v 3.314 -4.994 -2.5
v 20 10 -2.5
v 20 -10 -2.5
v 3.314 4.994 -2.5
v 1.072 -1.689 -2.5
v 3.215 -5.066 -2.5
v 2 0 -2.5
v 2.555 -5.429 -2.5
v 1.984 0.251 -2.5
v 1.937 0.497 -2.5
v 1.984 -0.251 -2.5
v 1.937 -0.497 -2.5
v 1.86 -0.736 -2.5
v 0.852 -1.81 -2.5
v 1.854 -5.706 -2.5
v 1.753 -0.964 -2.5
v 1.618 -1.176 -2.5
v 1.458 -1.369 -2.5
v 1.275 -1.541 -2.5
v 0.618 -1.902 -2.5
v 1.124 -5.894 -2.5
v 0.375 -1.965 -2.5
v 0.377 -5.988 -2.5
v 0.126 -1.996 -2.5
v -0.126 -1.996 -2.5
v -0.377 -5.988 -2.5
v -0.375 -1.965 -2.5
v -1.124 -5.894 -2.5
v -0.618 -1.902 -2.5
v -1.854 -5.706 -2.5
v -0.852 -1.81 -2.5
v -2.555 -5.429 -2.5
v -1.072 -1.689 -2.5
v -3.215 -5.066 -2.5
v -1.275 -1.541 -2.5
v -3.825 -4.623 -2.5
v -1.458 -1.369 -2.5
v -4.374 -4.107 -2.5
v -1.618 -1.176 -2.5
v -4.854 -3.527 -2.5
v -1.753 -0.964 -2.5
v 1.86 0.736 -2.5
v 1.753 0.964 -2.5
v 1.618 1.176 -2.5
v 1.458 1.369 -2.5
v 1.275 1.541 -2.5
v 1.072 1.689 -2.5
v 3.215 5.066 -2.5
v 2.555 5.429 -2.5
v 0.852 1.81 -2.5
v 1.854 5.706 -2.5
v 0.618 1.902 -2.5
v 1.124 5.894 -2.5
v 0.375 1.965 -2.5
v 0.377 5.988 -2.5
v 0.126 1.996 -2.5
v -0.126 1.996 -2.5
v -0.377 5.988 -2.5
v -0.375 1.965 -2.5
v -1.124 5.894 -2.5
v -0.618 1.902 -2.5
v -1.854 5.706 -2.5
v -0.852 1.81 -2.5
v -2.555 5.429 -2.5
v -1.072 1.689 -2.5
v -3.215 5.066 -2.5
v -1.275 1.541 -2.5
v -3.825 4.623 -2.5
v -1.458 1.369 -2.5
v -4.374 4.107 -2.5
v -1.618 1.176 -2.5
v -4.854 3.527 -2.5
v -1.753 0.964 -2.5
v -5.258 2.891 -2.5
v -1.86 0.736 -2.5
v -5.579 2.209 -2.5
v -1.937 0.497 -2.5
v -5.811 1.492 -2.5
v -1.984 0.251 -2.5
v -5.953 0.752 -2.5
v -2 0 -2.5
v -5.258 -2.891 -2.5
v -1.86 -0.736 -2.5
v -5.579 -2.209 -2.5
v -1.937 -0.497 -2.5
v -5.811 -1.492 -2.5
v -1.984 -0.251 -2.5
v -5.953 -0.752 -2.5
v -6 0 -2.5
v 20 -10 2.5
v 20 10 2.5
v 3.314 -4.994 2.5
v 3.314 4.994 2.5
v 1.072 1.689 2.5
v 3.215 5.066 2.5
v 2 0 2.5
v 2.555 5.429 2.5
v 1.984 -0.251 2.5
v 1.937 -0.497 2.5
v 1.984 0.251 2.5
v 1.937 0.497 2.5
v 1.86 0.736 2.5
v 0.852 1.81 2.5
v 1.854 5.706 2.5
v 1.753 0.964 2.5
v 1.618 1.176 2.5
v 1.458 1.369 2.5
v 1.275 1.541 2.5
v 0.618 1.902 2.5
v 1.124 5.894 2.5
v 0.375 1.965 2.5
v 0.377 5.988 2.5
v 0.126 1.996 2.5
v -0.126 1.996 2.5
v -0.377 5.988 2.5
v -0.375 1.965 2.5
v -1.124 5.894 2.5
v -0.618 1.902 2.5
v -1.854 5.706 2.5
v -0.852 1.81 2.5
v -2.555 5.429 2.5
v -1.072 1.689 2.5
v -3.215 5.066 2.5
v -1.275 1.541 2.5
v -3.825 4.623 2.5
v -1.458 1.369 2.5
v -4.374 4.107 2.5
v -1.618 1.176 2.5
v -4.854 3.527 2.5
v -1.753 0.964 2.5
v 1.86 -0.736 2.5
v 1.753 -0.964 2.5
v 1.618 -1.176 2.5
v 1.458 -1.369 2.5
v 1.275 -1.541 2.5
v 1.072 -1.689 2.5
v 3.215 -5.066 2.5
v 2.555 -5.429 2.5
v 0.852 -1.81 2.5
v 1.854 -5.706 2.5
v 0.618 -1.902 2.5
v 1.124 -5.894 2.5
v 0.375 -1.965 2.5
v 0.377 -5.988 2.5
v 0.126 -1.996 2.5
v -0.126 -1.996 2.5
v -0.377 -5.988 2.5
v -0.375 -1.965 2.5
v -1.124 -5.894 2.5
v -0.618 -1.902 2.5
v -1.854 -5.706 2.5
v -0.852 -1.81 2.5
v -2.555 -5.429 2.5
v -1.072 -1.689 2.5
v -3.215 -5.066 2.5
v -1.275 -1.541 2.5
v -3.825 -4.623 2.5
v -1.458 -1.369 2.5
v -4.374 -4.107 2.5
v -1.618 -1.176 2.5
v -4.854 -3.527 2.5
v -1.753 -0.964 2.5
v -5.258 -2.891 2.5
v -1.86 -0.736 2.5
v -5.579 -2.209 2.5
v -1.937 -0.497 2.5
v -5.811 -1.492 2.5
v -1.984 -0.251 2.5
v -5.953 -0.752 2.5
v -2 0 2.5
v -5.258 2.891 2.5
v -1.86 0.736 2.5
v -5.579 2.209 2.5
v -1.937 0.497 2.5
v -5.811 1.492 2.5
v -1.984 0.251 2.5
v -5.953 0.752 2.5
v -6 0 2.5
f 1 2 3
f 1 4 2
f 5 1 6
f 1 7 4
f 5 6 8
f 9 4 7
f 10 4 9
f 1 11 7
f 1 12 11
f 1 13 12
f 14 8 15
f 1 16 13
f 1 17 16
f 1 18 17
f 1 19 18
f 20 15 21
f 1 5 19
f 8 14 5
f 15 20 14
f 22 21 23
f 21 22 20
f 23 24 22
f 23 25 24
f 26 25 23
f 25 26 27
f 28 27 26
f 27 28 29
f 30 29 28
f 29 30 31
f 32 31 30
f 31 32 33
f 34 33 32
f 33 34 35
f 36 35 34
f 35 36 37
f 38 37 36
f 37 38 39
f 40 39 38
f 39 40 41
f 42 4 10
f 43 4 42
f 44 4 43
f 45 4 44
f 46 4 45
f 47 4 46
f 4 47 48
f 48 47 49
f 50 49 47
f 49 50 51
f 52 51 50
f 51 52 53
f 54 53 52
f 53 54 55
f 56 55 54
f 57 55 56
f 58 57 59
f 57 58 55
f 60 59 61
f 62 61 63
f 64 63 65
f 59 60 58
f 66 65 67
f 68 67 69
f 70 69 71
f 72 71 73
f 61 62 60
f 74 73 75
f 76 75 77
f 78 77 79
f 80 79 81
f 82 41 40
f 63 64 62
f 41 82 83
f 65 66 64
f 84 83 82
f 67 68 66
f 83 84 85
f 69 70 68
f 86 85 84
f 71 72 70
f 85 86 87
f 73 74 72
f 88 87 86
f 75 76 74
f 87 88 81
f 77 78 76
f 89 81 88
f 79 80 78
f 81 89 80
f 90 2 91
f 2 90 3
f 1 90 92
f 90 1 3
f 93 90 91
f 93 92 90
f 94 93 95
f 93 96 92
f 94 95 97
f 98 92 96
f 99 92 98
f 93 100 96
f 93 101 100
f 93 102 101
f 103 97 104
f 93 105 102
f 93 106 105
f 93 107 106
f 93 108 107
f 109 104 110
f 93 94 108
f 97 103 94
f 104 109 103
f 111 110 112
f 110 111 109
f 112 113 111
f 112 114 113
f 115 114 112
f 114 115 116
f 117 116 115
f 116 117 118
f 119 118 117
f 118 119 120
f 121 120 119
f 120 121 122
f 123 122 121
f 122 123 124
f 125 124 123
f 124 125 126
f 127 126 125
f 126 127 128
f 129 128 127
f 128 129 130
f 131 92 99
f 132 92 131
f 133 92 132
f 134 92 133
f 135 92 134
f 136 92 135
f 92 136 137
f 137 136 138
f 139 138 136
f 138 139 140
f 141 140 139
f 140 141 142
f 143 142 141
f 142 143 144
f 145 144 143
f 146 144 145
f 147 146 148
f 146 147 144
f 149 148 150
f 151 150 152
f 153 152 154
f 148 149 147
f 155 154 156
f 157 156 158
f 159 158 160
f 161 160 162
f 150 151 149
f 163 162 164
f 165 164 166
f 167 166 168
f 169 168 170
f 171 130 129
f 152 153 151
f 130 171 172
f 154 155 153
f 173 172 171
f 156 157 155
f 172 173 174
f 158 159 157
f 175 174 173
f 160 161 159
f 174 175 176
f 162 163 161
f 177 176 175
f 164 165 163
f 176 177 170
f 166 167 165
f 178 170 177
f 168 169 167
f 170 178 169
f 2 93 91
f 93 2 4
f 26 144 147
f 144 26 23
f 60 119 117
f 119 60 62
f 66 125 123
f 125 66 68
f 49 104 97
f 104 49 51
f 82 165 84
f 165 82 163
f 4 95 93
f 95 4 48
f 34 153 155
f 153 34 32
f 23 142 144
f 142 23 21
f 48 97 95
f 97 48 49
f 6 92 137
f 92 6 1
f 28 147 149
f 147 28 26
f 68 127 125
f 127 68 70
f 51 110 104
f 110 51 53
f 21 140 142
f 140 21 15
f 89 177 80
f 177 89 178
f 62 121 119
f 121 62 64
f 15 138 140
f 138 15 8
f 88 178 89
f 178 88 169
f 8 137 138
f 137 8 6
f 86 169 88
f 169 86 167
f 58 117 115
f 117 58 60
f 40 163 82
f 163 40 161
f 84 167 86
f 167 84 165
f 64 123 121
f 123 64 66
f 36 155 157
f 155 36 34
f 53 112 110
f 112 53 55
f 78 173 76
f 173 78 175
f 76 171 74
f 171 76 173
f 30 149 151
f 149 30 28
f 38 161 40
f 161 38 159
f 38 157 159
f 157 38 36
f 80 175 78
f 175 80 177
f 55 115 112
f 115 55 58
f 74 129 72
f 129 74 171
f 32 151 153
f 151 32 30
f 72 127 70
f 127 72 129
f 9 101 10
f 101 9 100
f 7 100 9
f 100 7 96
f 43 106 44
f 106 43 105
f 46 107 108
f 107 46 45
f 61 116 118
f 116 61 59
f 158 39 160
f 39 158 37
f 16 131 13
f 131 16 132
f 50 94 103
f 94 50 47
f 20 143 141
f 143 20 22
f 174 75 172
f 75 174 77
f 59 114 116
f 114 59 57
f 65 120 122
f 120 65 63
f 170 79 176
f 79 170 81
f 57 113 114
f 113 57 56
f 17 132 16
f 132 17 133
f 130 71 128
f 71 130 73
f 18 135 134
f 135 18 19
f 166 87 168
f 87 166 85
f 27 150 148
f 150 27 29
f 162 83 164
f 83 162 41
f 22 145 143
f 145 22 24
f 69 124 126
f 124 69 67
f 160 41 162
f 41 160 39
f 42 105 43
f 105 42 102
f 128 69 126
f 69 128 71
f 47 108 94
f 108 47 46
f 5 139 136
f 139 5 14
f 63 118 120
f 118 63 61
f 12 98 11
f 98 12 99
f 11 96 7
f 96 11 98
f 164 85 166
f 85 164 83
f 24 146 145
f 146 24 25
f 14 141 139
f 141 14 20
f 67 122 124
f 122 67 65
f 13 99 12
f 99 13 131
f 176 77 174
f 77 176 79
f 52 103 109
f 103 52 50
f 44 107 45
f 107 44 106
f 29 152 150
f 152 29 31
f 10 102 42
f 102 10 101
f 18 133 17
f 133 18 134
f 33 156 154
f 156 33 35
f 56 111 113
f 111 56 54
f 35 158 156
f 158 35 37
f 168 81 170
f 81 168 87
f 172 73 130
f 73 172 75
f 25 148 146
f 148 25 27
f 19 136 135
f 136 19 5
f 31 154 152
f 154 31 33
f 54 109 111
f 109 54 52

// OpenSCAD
picotR = 2.0;

footHeight = 5;

y1 = -4;
y2 = 4;
yy1 = -10;
yy2 = 10;
x1 = 0;
x2 = 20;
z1 = -footHeight / 2;
z2 = -z1;

cubex = 100;
cubey = 50;
cubez = 20;

// TODO: compute
angle = 45;

offset = 5;

CubePoints = [
  [  x1,  y1,  z1 ],  //0
  [ x2,  yy1,  z1 ],  //1
  [ x2,  yy2,  z1 ],  //2
  [  x1,  y2,  z1 ],  //3
  [  x1,  y1,  z2 ],  //4
  [ x2,  yy1,  z2 ],  //5
  [ x2,  yy2,  z2 ],  //6
  [  x1,  y2,  z2 ]]; //7
  
CubeFaces = [
  [0,1,2,3],  // bottom
  [4,5,1,0],  // front
  [7,6,5,4],  // top
  [5,6,2,1],  // right
  [6,7,3,2],  // back
  [7,4,0,3]]; // left

module foot() {  
difference() {
    union() {
        polyhedron( CubePoints, CubeFaces );

        cylinder(h = footHeight, r = 6, $fn = 50, center = true);
    }
    {
        cylinder(h = footHeight + 1, r = picotR, $fn = 50, center = true);
    }
}
}

foot();
/*
cube(size = [cubex, cubey, cubez], center = true);

translate([-((cubex / 2) + offset), -((cubey / 2) + offset), 0]) rotate([0, 0, angle]) foot();
translate([-((cubex / 2) + offset), ((cubey / 2) + offset), 0])  rotate([0, 0, -angle]) foot();
translate([((cubex / 2) + offset), -((cubey / 2) + offset), 0])  rotate([0, 0, 180 - angle]) foot();
translate([((cubex / 2) + offset), ((cubey / 2) + offset), 0])  rotate([0, 0, 180 + angle]) foot();
*/
